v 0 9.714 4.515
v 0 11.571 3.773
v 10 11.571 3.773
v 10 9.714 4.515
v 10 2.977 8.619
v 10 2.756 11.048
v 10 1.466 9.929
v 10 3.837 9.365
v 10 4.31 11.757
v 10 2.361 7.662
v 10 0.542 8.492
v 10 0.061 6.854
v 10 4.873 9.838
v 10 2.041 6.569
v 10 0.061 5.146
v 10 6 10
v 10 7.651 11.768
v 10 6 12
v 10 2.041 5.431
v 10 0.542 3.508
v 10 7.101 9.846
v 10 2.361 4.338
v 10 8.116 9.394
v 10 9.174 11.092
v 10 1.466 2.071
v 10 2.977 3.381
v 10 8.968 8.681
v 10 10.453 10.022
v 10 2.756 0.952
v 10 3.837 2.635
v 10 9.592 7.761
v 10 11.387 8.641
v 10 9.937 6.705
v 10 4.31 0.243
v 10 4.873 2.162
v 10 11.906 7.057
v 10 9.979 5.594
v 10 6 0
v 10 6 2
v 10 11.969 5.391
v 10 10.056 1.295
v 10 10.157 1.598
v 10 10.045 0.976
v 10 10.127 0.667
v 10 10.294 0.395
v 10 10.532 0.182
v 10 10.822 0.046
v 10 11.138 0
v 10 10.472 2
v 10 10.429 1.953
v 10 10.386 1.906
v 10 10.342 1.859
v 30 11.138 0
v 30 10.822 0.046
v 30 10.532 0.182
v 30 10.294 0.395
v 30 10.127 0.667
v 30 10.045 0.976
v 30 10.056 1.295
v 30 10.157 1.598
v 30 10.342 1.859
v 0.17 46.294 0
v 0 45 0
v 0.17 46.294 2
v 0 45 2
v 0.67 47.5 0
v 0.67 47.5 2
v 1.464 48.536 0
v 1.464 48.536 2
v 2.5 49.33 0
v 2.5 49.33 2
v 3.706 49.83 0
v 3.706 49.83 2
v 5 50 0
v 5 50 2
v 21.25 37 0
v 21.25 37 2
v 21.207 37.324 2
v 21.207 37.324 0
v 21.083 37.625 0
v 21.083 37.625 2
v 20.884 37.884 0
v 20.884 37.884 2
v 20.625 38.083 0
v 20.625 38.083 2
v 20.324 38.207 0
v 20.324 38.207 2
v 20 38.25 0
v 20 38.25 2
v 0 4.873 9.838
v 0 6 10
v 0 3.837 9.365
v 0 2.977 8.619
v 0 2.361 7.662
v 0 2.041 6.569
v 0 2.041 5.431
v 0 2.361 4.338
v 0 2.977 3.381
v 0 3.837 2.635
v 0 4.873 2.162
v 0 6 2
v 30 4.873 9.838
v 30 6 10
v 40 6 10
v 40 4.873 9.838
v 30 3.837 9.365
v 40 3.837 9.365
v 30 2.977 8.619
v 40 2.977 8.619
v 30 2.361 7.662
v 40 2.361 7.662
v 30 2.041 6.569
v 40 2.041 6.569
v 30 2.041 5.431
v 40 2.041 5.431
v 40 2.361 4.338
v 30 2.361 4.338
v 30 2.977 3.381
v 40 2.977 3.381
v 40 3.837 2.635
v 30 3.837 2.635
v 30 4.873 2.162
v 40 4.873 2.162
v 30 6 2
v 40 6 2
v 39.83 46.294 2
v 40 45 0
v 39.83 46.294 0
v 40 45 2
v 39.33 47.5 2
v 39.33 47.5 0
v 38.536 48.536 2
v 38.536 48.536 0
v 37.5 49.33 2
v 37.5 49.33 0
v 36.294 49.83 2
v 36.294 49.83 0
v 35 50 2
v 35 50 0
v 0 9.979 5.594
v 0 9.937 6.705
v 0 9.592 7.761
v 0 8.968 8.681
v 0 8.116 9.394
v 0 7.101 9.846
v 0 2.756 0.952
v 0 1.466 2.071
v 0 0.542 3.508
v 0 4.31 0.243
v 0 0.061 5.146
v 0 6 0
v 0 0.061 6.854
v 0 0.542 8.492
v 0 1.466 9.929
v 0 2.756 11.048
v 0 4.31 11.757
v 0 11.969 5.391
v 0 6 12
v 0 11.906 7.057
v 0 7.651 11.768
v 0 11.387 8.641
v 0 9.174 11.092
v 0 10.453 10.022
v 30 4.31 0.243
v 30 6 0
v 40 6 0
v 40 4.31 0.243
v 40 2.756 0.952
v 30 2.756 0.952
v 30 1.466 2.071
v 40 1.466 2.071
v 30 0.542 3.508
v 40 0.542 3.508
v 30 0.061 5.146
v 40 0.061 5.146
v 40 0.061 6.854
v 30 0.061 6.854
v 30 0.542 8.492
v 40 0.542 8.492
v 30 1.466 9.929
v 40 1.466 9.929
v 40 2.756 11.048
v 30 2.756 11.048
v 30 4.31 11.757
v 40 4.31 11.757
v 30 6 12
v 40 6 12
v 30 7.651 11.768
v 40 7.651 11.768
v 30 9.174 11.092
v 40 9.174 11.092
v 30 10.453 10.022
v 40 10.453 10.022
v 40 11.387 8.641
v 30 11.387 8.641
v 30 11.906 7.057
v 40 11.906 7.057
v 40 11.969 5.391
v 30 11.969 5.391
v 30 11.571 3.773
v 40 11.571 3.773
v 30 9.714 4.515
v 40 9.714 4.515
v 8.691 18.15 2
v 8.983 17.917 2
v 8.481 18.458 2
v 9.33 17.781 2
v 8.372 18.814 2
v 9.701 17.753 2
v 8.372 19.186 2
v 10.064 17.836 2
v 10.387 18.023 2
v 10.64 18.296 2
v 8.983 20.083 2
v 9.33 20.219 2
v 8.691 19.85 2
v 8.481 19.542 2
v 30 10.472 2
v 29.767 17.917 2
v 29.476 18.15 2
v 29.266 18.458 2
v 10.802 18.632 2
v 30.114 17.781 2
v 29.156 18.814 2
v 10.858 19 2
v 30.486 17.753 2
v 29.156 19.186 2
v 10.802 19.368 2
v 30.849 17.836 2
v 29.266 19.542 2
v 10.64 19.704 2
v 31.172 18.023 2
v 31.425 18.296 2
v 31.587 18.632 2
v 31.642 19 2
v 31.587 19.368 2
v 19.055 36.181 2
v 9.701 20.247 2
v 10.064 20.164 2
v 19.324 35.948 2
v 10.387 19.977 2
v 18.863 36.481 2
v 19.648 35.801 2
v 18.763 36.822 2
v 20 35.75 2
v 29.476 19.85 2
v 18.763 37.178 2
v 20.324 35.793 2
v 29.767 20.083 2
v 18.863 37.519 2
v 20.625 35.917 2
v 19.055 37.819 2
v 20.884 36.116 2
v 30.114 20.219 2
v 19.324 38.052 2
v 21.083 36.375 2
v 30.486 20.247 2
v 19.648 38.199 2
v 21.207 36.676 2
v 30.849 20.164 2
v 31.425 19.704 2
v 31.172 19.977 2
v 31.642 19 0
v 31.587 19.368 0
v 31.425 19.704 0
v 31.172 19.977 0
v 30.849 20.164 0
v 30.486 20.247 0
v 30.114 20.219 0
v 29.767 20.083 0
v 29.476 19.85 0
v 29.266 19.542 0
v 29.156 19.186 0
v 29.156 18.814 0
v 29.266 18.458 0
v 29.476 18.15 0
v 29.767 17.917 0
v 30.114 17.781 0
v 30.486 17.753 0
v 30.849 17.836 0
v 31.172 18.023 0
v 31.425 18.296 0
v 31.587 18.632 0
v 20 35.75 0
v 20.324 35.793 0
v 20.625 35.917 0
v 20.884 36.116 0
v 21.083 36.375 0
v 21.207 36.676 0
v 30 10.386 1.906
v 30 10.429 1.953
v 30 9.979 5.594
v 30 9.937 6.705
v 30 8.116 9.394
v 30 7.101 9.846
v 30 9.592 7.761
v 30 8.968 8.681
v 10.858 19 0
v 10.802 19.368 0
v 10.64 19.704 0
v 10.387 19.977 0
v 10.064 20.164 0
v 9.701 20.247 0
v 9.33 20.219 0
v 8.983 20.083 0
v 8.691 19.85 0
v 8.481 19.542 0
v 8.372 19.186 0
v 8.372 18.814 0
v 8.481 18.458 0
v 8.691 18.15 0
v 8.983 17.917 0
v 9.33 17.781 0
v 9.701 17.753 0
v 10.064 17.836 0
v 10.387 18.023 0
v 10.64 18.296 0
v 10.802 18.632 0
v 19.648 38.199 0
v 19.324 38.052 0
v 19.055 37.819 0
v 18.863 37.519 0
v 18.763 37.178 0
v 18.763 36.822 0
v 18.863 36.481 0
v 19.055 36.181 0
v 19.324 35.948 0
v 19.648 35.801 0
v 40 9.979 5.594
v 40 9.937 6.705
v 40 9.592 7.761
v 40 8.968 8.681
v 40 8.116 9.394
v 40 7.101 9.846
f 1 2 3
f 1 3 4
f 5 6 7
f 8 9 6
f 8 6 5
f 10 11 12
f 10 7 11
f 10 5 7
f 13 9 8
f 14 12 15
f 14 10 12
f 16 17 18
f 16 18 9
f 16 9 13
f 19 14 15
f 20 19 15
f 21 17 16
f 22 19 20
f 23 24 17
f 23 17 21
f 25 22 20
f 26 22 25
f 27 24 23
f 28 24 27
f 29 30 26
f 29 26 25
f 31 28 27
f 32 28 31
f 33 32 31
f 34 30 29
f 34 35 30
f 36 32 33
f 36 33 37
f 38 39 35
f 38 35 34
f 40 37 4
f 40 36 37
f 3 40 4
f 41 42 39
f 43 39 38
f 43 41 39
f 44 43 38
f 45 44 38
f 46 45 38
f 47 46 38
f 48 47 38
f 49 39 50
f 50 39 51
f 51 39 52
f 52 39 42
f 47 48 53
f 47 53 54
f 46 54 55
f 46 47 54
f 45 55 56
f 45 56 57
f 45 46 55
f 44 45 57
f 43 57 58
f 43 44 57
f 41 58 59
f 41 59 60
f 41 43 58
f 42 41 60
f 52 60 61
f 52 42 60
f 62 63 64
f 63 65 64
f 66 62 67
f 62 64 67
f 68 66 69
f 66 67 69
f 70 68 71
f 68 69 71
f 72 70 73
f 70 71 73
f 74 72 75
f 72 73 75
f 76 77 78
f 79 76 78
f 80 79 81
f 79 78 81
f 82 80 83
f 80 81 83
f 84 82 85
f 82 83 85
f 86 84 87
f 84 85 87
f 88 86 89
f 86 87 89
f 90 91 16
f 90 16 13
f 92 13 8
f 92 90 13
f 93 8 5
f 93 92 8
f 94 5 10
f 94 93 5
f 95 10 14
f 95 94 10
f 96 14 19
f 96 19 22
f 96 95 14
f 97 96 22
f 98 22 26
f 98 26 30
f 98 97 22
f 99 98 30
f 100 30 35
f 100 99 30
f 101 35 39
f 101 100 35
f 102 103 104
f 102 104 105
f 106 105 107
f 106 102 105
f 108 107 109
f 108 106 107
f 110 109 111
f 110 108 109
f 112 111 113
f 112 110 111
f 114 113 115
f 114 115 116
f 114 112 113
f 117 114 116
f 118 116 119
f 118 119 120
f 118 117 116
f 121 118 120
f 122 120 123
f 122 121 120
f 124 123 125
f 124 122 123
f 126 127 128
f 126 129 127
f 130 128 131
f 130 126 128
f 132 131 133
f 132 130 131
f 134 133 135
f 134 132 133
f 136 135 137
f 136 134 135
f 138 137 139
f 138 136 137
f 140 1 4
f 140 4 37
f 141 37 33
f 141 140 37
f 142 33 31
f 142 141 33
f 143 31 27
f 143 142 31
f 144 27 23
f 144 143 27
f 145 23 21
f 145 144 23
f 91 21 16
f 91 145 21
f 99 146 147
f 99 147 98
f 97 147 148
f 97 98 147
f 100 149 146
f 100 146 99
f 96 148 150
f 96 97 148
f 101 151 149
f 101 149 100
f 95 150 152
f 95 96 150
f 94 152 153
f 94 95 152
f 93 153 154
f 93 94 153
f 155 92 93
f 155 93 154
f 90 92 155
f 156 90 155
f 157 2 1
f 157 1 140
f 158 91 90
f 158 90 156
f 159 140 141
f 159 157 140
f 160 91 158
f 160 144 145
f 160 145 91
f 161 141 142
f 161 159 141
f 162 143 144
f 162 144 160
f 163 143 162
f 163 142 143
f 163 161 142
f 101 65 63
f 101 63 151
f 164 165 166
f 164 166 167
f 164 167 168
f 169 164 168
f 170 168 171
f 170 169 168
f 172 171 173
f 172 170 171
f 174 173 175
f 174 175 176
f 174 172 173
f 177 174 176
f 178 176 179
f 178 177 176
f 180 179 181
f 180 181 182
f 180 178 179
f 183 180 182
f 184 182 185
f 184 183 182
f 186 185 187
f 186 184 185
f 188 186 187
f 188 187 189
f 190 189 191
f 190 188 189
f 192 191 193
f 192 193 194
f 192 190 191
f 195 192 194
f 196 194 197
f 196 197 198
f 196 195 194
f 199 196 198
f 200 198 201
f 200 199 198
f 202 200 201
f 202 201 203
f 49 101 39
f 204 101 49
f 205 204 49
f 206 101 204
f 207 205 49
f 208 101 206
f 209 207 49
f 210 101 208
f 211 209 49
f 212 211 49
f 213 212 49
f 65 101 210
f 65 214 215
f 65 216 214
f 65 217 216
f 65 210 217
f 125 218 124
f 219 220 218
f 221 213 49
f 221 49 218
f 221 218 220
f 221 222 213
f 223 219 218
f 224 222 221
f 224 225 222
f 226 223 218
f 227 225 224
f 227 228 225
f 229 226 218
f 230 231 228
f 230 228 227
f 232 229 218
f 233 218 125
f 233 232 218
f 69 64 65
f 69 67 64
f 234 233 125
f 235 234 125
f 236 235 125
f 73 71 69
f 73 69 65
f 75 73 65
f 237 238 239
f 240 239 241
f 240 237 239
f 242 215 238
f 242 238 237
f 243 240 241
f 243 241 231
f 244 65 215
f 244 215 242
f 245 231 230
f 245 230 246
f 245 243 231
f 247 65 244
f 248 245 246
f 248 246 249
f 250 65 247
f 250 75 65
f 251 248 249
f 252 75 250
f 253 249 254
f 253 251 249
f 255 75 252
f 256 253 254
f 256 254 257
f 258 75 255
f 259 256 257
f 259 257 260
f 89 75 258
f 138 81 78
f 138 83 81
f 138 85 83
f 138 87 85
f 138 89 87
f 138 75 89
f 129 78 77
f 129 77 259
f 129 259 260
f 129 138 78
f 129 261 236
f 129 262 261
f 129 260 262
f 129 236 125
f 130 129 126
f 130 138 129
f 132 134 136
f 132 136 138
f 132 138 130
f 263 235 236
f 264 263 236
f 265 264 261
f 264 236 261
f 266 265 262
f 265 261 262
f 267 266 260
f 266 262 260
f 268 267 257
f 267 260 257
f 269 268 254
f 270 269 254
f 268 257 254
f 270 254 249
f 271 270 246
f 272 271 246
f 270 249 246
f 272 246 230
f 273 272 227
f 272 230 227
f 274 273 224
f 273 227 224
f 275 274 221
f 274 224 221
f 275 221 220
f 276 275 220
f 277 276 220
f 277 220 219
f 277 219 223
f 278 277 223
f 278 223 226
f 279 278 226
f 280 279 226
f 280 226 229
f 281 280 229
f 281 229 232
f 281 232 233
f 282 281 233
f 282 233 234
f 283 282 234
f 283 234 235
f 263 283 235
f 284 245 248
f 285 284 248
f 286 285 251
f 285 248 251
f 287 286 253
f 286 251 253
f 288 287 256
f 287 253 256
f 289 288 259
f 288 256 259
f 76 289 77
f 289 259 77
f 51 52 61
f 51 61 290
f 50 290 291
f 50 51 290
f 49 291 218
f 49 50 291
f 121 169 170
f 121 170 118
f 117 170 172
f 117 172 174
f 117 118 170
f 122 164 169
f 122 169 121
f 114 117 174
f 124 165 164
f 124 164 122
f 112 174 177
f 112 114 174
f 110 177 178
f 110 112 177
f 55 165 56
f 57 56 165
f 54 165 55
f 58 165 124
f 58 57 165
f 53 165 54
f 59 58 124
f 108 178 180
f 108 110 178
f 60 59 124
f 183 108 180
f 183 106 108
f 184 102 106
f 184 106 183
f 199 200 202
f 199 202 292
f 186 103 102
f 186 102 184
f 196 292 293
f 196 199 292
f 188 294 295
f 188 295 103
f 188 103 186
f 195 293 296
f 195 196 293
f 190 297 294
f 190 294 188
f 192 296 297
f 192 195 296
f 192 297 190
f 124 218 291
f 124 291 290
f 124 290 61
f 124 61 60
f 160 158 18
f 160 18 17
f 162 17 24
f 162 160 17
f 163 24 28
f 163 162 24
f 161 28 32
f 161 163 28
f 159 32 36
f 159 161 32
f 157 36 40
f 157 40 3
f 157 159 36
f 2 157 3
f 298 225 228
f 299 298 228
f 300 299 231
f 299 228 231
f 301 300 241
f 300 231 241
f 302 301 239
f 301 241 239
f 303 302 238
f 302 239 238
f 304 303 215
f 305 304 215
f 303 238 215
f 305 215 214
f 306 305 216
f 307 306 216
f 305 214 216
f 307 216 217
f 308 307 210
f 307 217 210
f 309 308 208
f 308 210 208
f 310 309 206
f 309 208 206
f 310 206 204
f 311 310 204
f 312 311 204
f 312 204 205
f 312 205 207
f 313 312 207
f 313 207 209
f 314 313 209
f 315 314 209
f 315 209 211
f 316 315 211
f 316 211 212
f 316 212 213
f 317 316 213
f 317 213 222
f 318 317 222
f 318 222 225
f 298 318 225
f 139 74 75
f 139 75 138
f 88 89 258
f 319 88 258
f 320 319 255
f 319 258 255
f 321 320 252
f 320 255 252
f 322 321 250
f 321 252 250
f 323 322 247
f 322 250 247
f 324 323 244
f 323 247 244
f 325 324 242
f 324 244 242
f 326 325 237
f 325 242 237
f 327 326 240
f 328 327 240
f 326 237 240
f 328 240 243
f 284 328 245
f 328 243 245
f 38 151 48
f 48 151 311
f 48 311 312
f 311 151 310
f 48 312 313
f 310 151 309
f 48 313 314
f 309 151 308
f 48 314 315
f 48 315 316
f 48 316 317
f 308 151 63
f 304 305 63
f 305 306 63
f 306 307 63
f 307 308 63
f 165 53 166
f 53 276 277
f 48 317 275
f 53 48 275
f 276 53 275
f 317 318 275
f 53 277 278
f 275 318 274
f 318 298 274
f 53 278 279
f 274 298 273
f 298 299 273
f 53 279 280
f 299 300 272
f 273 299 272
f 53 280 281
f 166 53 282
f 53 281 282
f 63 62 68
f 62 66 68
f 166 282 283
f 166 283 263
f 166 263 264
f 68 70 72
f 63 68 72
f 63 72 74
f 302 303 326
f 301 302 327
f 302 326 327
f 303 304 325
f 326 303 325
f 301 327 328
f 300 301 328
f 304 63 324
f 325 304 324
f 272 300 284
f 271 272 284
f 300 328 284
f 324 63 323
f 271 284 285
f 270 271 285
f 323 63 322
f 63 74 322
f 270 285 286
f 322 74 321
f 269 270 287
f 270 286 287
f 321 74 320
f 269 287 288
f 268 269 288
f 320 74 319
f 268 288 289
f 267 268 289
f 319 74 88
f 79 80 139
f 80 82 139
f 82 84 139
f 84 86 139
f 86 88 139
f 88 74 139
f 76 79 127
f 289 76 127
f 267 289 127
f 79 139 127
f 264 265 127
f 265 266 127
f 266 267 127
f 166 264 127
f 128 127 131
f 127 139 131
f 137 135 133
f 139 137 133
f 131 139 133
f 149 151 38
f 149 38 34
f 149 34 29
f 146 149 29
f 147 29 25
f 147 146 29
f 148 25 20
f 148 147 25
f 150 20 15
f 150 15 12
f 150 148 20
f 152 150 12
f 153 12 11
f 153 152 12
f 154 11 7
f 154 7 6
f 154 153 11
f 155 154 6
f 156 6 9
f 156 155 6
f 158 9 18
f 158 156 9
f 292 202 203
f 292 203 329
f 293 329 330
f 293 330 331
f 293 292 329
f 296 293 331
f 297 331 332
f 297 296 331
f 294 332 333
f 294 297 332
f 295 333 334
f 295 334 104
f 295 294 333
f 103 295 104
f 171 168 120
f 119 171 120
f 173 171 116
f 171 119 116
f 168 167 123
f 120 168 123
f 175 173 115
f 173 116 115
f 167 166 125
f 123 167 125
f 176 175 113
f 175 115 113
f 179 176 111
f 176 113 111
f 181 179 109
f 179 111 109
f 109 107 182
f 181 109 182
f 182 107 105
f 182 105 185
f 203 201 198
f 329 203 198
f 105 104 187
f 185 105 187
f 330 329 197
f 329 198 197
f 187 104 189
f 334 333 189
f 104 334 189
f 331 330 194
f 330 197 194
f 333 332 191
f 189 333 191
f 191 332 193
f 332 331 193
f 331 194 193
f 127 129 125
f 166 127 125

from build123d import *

# Parameters (mm, degrees)
SKETCH1_W           = 40
SKETCH1_H           = 50
BOSS_EXTRUDE1_DEPTH = 2
FILLET1_R           = 5
SKETCH2_R           = 1.25
CUT_EXTRUDE1_DEPTH  = 3
SKETCH3_W           = 40
SKETCH3_H           = 6
CUT_EXTRUDE3_DEPTH  = 3
BOSS_EXTRUDE2_DEPTH = 10
BOSS_EXTRUDE3_START = 10
BOSS_EXTRUDE3_DEPTH = 10
SKETCH7_R           = 6
CUT_EXTRUDE4_DEPTH  = 20
FILLET2_START       = 10
FILLET2_DEPTH       = 20


with BuildPart() as part:
    # Sketch1 → Boss-Extrude1 (new body)
    with BuildSketch(Plane.XY):
        with Locations((20, 25)):
            Rectangle(SKETCH1_W, SKETCH1_H)
    extrude(amount=BOSS_EXTRUDE1_DEPTH)

    # Fillet1
    fillet1_edges = [part.edges().sort_by_distance(p)[0] for p in [
        (0, 50, 1),
        (40, 50, 1),
    ]]
    fillet(fillet1_edges, radius=FILLET1_R)

    # Sketch2 → Cut-Extrude1 (cut)
    with BuildSketch(Plane.XY.offset(2)):
        with Locations((30.392304845, 19)):
            Circle(SKETCH2_R)
        with Locations((9.607695155, 19)):
            Circle(SKETCH2_R)
        with BuildLine():
            ThreePointArc((21.25, 37), (20.883883476, 37.883883476), (20, 38.25))
            Line((20, 38.25), (20, 35.75))
            ThreePointArc((20, 35.75), (20.883883476, 36.116116524), (21.25, 37))
        make_face()
        with BuildLine():
            Line((20, 35.75), (20, 38.25))
            ThreePointArc((20, 38.25), (18.75, 37), (20, 35.75))
        make_face()
    extrude(amount=-CUT_EXTRUDE1_DEPTH, mode=Mode.SUBTRACT)

    # Sketch3 → Cut-Extrude3 (cut)
    with BuildSketch(Plane.XY.offset(2)):
        with Locations((20, 3)):
            Rectangle(SKETCH3_W, SKETCH3_H)
    extrude(amount=-CUT_EXTRUDE3_DEPTH, mode=Mode.SUBTRACT)

    # Sketch5 → Boss-Extrude2 (add)
    with BuildSketch(Plane.ZY):
        with BuildLine():
            Line((3.77260129, 11.571238192), (4.515067527, 9.714158794))
            ThreePointArc((4.515067527, 9.714158794), (8.242796258, 9.312078644), (10, 6))
            ThreePointArc((10, 6), (6, 2), (2, 6))
            Line((2, 6), (0, 6))
            ThreePointArc((0, 6), (6, 0), (12, 6))
            ThreePointArc((12, 6), (9.364194387, 10.968117966), (3.77260129, 11.571238192))
        make_face()
    extrude(amount=-BOSS_EXTRUDE2_DEPTH)

    # Sketch6 → Boss-Extrude3 (add)
    with BuildSketch(Plane(origin=(40, 0, -40), x_dir=(0, 0, 1), z_dir=(-1, 0, 0)).offset(BOSS_EXTRUDE3_START)):
        with BuildLine():
            Line((43.77260129, 11.571238192), (44.515067527, 9.714158794))
            ThreePointArc((44.515067527, 9.714158794), (48.242796258, 9.312078644), (50, 6))
            ThreePointArc((50, 6), (46, 2), (42, 6))
            Line((42, 6), (40, 6))
            ThreePointArc((40, 6), (46, 0), (52, 6))
            ThreePointArc((52, 6), (49.364194387, 10.968117966), (43.77260129, 11.571238192))
        make_face()
    extrude(amount=-BOSS_EXTRUDE3_DEPTH)

    # Sketch7 → Cut-Extrude4 (cut)
    with BuildSketch(Plane(origin=(10, 0, 0), x_dir=(0, 0, -1), z_dir=(1, 0, 0))):
        with Locations((-6, 6)):
            Circle(SKETCH7_R)
    extrude(amount=CUT_EXTRUDE4_DEPTH, mode=Mode.SUBTRACT)

    # Fillet2: read off the stored shape, not the designer's step
    # Fillet2 outline → Fillet2 (cut)
    with BuildSketch(Plane.YZ.offset(FILLET2_START)):
        with BuildLine():
            Line((6, 0), (11.138093031, 0))
            ThreePointArc((11.138093031, 0), (10.1268882, 0.667027959), (10.342050449, 1.85915493))
            ThreePointArc((10.342050449, 1.85915493), (8.361665681, 0.484337283), (6, 0))
        make_face()
    extrude(amount=FILLET2_DEPTH, mode=Mode.SUBTRACT)


solid = part.part
